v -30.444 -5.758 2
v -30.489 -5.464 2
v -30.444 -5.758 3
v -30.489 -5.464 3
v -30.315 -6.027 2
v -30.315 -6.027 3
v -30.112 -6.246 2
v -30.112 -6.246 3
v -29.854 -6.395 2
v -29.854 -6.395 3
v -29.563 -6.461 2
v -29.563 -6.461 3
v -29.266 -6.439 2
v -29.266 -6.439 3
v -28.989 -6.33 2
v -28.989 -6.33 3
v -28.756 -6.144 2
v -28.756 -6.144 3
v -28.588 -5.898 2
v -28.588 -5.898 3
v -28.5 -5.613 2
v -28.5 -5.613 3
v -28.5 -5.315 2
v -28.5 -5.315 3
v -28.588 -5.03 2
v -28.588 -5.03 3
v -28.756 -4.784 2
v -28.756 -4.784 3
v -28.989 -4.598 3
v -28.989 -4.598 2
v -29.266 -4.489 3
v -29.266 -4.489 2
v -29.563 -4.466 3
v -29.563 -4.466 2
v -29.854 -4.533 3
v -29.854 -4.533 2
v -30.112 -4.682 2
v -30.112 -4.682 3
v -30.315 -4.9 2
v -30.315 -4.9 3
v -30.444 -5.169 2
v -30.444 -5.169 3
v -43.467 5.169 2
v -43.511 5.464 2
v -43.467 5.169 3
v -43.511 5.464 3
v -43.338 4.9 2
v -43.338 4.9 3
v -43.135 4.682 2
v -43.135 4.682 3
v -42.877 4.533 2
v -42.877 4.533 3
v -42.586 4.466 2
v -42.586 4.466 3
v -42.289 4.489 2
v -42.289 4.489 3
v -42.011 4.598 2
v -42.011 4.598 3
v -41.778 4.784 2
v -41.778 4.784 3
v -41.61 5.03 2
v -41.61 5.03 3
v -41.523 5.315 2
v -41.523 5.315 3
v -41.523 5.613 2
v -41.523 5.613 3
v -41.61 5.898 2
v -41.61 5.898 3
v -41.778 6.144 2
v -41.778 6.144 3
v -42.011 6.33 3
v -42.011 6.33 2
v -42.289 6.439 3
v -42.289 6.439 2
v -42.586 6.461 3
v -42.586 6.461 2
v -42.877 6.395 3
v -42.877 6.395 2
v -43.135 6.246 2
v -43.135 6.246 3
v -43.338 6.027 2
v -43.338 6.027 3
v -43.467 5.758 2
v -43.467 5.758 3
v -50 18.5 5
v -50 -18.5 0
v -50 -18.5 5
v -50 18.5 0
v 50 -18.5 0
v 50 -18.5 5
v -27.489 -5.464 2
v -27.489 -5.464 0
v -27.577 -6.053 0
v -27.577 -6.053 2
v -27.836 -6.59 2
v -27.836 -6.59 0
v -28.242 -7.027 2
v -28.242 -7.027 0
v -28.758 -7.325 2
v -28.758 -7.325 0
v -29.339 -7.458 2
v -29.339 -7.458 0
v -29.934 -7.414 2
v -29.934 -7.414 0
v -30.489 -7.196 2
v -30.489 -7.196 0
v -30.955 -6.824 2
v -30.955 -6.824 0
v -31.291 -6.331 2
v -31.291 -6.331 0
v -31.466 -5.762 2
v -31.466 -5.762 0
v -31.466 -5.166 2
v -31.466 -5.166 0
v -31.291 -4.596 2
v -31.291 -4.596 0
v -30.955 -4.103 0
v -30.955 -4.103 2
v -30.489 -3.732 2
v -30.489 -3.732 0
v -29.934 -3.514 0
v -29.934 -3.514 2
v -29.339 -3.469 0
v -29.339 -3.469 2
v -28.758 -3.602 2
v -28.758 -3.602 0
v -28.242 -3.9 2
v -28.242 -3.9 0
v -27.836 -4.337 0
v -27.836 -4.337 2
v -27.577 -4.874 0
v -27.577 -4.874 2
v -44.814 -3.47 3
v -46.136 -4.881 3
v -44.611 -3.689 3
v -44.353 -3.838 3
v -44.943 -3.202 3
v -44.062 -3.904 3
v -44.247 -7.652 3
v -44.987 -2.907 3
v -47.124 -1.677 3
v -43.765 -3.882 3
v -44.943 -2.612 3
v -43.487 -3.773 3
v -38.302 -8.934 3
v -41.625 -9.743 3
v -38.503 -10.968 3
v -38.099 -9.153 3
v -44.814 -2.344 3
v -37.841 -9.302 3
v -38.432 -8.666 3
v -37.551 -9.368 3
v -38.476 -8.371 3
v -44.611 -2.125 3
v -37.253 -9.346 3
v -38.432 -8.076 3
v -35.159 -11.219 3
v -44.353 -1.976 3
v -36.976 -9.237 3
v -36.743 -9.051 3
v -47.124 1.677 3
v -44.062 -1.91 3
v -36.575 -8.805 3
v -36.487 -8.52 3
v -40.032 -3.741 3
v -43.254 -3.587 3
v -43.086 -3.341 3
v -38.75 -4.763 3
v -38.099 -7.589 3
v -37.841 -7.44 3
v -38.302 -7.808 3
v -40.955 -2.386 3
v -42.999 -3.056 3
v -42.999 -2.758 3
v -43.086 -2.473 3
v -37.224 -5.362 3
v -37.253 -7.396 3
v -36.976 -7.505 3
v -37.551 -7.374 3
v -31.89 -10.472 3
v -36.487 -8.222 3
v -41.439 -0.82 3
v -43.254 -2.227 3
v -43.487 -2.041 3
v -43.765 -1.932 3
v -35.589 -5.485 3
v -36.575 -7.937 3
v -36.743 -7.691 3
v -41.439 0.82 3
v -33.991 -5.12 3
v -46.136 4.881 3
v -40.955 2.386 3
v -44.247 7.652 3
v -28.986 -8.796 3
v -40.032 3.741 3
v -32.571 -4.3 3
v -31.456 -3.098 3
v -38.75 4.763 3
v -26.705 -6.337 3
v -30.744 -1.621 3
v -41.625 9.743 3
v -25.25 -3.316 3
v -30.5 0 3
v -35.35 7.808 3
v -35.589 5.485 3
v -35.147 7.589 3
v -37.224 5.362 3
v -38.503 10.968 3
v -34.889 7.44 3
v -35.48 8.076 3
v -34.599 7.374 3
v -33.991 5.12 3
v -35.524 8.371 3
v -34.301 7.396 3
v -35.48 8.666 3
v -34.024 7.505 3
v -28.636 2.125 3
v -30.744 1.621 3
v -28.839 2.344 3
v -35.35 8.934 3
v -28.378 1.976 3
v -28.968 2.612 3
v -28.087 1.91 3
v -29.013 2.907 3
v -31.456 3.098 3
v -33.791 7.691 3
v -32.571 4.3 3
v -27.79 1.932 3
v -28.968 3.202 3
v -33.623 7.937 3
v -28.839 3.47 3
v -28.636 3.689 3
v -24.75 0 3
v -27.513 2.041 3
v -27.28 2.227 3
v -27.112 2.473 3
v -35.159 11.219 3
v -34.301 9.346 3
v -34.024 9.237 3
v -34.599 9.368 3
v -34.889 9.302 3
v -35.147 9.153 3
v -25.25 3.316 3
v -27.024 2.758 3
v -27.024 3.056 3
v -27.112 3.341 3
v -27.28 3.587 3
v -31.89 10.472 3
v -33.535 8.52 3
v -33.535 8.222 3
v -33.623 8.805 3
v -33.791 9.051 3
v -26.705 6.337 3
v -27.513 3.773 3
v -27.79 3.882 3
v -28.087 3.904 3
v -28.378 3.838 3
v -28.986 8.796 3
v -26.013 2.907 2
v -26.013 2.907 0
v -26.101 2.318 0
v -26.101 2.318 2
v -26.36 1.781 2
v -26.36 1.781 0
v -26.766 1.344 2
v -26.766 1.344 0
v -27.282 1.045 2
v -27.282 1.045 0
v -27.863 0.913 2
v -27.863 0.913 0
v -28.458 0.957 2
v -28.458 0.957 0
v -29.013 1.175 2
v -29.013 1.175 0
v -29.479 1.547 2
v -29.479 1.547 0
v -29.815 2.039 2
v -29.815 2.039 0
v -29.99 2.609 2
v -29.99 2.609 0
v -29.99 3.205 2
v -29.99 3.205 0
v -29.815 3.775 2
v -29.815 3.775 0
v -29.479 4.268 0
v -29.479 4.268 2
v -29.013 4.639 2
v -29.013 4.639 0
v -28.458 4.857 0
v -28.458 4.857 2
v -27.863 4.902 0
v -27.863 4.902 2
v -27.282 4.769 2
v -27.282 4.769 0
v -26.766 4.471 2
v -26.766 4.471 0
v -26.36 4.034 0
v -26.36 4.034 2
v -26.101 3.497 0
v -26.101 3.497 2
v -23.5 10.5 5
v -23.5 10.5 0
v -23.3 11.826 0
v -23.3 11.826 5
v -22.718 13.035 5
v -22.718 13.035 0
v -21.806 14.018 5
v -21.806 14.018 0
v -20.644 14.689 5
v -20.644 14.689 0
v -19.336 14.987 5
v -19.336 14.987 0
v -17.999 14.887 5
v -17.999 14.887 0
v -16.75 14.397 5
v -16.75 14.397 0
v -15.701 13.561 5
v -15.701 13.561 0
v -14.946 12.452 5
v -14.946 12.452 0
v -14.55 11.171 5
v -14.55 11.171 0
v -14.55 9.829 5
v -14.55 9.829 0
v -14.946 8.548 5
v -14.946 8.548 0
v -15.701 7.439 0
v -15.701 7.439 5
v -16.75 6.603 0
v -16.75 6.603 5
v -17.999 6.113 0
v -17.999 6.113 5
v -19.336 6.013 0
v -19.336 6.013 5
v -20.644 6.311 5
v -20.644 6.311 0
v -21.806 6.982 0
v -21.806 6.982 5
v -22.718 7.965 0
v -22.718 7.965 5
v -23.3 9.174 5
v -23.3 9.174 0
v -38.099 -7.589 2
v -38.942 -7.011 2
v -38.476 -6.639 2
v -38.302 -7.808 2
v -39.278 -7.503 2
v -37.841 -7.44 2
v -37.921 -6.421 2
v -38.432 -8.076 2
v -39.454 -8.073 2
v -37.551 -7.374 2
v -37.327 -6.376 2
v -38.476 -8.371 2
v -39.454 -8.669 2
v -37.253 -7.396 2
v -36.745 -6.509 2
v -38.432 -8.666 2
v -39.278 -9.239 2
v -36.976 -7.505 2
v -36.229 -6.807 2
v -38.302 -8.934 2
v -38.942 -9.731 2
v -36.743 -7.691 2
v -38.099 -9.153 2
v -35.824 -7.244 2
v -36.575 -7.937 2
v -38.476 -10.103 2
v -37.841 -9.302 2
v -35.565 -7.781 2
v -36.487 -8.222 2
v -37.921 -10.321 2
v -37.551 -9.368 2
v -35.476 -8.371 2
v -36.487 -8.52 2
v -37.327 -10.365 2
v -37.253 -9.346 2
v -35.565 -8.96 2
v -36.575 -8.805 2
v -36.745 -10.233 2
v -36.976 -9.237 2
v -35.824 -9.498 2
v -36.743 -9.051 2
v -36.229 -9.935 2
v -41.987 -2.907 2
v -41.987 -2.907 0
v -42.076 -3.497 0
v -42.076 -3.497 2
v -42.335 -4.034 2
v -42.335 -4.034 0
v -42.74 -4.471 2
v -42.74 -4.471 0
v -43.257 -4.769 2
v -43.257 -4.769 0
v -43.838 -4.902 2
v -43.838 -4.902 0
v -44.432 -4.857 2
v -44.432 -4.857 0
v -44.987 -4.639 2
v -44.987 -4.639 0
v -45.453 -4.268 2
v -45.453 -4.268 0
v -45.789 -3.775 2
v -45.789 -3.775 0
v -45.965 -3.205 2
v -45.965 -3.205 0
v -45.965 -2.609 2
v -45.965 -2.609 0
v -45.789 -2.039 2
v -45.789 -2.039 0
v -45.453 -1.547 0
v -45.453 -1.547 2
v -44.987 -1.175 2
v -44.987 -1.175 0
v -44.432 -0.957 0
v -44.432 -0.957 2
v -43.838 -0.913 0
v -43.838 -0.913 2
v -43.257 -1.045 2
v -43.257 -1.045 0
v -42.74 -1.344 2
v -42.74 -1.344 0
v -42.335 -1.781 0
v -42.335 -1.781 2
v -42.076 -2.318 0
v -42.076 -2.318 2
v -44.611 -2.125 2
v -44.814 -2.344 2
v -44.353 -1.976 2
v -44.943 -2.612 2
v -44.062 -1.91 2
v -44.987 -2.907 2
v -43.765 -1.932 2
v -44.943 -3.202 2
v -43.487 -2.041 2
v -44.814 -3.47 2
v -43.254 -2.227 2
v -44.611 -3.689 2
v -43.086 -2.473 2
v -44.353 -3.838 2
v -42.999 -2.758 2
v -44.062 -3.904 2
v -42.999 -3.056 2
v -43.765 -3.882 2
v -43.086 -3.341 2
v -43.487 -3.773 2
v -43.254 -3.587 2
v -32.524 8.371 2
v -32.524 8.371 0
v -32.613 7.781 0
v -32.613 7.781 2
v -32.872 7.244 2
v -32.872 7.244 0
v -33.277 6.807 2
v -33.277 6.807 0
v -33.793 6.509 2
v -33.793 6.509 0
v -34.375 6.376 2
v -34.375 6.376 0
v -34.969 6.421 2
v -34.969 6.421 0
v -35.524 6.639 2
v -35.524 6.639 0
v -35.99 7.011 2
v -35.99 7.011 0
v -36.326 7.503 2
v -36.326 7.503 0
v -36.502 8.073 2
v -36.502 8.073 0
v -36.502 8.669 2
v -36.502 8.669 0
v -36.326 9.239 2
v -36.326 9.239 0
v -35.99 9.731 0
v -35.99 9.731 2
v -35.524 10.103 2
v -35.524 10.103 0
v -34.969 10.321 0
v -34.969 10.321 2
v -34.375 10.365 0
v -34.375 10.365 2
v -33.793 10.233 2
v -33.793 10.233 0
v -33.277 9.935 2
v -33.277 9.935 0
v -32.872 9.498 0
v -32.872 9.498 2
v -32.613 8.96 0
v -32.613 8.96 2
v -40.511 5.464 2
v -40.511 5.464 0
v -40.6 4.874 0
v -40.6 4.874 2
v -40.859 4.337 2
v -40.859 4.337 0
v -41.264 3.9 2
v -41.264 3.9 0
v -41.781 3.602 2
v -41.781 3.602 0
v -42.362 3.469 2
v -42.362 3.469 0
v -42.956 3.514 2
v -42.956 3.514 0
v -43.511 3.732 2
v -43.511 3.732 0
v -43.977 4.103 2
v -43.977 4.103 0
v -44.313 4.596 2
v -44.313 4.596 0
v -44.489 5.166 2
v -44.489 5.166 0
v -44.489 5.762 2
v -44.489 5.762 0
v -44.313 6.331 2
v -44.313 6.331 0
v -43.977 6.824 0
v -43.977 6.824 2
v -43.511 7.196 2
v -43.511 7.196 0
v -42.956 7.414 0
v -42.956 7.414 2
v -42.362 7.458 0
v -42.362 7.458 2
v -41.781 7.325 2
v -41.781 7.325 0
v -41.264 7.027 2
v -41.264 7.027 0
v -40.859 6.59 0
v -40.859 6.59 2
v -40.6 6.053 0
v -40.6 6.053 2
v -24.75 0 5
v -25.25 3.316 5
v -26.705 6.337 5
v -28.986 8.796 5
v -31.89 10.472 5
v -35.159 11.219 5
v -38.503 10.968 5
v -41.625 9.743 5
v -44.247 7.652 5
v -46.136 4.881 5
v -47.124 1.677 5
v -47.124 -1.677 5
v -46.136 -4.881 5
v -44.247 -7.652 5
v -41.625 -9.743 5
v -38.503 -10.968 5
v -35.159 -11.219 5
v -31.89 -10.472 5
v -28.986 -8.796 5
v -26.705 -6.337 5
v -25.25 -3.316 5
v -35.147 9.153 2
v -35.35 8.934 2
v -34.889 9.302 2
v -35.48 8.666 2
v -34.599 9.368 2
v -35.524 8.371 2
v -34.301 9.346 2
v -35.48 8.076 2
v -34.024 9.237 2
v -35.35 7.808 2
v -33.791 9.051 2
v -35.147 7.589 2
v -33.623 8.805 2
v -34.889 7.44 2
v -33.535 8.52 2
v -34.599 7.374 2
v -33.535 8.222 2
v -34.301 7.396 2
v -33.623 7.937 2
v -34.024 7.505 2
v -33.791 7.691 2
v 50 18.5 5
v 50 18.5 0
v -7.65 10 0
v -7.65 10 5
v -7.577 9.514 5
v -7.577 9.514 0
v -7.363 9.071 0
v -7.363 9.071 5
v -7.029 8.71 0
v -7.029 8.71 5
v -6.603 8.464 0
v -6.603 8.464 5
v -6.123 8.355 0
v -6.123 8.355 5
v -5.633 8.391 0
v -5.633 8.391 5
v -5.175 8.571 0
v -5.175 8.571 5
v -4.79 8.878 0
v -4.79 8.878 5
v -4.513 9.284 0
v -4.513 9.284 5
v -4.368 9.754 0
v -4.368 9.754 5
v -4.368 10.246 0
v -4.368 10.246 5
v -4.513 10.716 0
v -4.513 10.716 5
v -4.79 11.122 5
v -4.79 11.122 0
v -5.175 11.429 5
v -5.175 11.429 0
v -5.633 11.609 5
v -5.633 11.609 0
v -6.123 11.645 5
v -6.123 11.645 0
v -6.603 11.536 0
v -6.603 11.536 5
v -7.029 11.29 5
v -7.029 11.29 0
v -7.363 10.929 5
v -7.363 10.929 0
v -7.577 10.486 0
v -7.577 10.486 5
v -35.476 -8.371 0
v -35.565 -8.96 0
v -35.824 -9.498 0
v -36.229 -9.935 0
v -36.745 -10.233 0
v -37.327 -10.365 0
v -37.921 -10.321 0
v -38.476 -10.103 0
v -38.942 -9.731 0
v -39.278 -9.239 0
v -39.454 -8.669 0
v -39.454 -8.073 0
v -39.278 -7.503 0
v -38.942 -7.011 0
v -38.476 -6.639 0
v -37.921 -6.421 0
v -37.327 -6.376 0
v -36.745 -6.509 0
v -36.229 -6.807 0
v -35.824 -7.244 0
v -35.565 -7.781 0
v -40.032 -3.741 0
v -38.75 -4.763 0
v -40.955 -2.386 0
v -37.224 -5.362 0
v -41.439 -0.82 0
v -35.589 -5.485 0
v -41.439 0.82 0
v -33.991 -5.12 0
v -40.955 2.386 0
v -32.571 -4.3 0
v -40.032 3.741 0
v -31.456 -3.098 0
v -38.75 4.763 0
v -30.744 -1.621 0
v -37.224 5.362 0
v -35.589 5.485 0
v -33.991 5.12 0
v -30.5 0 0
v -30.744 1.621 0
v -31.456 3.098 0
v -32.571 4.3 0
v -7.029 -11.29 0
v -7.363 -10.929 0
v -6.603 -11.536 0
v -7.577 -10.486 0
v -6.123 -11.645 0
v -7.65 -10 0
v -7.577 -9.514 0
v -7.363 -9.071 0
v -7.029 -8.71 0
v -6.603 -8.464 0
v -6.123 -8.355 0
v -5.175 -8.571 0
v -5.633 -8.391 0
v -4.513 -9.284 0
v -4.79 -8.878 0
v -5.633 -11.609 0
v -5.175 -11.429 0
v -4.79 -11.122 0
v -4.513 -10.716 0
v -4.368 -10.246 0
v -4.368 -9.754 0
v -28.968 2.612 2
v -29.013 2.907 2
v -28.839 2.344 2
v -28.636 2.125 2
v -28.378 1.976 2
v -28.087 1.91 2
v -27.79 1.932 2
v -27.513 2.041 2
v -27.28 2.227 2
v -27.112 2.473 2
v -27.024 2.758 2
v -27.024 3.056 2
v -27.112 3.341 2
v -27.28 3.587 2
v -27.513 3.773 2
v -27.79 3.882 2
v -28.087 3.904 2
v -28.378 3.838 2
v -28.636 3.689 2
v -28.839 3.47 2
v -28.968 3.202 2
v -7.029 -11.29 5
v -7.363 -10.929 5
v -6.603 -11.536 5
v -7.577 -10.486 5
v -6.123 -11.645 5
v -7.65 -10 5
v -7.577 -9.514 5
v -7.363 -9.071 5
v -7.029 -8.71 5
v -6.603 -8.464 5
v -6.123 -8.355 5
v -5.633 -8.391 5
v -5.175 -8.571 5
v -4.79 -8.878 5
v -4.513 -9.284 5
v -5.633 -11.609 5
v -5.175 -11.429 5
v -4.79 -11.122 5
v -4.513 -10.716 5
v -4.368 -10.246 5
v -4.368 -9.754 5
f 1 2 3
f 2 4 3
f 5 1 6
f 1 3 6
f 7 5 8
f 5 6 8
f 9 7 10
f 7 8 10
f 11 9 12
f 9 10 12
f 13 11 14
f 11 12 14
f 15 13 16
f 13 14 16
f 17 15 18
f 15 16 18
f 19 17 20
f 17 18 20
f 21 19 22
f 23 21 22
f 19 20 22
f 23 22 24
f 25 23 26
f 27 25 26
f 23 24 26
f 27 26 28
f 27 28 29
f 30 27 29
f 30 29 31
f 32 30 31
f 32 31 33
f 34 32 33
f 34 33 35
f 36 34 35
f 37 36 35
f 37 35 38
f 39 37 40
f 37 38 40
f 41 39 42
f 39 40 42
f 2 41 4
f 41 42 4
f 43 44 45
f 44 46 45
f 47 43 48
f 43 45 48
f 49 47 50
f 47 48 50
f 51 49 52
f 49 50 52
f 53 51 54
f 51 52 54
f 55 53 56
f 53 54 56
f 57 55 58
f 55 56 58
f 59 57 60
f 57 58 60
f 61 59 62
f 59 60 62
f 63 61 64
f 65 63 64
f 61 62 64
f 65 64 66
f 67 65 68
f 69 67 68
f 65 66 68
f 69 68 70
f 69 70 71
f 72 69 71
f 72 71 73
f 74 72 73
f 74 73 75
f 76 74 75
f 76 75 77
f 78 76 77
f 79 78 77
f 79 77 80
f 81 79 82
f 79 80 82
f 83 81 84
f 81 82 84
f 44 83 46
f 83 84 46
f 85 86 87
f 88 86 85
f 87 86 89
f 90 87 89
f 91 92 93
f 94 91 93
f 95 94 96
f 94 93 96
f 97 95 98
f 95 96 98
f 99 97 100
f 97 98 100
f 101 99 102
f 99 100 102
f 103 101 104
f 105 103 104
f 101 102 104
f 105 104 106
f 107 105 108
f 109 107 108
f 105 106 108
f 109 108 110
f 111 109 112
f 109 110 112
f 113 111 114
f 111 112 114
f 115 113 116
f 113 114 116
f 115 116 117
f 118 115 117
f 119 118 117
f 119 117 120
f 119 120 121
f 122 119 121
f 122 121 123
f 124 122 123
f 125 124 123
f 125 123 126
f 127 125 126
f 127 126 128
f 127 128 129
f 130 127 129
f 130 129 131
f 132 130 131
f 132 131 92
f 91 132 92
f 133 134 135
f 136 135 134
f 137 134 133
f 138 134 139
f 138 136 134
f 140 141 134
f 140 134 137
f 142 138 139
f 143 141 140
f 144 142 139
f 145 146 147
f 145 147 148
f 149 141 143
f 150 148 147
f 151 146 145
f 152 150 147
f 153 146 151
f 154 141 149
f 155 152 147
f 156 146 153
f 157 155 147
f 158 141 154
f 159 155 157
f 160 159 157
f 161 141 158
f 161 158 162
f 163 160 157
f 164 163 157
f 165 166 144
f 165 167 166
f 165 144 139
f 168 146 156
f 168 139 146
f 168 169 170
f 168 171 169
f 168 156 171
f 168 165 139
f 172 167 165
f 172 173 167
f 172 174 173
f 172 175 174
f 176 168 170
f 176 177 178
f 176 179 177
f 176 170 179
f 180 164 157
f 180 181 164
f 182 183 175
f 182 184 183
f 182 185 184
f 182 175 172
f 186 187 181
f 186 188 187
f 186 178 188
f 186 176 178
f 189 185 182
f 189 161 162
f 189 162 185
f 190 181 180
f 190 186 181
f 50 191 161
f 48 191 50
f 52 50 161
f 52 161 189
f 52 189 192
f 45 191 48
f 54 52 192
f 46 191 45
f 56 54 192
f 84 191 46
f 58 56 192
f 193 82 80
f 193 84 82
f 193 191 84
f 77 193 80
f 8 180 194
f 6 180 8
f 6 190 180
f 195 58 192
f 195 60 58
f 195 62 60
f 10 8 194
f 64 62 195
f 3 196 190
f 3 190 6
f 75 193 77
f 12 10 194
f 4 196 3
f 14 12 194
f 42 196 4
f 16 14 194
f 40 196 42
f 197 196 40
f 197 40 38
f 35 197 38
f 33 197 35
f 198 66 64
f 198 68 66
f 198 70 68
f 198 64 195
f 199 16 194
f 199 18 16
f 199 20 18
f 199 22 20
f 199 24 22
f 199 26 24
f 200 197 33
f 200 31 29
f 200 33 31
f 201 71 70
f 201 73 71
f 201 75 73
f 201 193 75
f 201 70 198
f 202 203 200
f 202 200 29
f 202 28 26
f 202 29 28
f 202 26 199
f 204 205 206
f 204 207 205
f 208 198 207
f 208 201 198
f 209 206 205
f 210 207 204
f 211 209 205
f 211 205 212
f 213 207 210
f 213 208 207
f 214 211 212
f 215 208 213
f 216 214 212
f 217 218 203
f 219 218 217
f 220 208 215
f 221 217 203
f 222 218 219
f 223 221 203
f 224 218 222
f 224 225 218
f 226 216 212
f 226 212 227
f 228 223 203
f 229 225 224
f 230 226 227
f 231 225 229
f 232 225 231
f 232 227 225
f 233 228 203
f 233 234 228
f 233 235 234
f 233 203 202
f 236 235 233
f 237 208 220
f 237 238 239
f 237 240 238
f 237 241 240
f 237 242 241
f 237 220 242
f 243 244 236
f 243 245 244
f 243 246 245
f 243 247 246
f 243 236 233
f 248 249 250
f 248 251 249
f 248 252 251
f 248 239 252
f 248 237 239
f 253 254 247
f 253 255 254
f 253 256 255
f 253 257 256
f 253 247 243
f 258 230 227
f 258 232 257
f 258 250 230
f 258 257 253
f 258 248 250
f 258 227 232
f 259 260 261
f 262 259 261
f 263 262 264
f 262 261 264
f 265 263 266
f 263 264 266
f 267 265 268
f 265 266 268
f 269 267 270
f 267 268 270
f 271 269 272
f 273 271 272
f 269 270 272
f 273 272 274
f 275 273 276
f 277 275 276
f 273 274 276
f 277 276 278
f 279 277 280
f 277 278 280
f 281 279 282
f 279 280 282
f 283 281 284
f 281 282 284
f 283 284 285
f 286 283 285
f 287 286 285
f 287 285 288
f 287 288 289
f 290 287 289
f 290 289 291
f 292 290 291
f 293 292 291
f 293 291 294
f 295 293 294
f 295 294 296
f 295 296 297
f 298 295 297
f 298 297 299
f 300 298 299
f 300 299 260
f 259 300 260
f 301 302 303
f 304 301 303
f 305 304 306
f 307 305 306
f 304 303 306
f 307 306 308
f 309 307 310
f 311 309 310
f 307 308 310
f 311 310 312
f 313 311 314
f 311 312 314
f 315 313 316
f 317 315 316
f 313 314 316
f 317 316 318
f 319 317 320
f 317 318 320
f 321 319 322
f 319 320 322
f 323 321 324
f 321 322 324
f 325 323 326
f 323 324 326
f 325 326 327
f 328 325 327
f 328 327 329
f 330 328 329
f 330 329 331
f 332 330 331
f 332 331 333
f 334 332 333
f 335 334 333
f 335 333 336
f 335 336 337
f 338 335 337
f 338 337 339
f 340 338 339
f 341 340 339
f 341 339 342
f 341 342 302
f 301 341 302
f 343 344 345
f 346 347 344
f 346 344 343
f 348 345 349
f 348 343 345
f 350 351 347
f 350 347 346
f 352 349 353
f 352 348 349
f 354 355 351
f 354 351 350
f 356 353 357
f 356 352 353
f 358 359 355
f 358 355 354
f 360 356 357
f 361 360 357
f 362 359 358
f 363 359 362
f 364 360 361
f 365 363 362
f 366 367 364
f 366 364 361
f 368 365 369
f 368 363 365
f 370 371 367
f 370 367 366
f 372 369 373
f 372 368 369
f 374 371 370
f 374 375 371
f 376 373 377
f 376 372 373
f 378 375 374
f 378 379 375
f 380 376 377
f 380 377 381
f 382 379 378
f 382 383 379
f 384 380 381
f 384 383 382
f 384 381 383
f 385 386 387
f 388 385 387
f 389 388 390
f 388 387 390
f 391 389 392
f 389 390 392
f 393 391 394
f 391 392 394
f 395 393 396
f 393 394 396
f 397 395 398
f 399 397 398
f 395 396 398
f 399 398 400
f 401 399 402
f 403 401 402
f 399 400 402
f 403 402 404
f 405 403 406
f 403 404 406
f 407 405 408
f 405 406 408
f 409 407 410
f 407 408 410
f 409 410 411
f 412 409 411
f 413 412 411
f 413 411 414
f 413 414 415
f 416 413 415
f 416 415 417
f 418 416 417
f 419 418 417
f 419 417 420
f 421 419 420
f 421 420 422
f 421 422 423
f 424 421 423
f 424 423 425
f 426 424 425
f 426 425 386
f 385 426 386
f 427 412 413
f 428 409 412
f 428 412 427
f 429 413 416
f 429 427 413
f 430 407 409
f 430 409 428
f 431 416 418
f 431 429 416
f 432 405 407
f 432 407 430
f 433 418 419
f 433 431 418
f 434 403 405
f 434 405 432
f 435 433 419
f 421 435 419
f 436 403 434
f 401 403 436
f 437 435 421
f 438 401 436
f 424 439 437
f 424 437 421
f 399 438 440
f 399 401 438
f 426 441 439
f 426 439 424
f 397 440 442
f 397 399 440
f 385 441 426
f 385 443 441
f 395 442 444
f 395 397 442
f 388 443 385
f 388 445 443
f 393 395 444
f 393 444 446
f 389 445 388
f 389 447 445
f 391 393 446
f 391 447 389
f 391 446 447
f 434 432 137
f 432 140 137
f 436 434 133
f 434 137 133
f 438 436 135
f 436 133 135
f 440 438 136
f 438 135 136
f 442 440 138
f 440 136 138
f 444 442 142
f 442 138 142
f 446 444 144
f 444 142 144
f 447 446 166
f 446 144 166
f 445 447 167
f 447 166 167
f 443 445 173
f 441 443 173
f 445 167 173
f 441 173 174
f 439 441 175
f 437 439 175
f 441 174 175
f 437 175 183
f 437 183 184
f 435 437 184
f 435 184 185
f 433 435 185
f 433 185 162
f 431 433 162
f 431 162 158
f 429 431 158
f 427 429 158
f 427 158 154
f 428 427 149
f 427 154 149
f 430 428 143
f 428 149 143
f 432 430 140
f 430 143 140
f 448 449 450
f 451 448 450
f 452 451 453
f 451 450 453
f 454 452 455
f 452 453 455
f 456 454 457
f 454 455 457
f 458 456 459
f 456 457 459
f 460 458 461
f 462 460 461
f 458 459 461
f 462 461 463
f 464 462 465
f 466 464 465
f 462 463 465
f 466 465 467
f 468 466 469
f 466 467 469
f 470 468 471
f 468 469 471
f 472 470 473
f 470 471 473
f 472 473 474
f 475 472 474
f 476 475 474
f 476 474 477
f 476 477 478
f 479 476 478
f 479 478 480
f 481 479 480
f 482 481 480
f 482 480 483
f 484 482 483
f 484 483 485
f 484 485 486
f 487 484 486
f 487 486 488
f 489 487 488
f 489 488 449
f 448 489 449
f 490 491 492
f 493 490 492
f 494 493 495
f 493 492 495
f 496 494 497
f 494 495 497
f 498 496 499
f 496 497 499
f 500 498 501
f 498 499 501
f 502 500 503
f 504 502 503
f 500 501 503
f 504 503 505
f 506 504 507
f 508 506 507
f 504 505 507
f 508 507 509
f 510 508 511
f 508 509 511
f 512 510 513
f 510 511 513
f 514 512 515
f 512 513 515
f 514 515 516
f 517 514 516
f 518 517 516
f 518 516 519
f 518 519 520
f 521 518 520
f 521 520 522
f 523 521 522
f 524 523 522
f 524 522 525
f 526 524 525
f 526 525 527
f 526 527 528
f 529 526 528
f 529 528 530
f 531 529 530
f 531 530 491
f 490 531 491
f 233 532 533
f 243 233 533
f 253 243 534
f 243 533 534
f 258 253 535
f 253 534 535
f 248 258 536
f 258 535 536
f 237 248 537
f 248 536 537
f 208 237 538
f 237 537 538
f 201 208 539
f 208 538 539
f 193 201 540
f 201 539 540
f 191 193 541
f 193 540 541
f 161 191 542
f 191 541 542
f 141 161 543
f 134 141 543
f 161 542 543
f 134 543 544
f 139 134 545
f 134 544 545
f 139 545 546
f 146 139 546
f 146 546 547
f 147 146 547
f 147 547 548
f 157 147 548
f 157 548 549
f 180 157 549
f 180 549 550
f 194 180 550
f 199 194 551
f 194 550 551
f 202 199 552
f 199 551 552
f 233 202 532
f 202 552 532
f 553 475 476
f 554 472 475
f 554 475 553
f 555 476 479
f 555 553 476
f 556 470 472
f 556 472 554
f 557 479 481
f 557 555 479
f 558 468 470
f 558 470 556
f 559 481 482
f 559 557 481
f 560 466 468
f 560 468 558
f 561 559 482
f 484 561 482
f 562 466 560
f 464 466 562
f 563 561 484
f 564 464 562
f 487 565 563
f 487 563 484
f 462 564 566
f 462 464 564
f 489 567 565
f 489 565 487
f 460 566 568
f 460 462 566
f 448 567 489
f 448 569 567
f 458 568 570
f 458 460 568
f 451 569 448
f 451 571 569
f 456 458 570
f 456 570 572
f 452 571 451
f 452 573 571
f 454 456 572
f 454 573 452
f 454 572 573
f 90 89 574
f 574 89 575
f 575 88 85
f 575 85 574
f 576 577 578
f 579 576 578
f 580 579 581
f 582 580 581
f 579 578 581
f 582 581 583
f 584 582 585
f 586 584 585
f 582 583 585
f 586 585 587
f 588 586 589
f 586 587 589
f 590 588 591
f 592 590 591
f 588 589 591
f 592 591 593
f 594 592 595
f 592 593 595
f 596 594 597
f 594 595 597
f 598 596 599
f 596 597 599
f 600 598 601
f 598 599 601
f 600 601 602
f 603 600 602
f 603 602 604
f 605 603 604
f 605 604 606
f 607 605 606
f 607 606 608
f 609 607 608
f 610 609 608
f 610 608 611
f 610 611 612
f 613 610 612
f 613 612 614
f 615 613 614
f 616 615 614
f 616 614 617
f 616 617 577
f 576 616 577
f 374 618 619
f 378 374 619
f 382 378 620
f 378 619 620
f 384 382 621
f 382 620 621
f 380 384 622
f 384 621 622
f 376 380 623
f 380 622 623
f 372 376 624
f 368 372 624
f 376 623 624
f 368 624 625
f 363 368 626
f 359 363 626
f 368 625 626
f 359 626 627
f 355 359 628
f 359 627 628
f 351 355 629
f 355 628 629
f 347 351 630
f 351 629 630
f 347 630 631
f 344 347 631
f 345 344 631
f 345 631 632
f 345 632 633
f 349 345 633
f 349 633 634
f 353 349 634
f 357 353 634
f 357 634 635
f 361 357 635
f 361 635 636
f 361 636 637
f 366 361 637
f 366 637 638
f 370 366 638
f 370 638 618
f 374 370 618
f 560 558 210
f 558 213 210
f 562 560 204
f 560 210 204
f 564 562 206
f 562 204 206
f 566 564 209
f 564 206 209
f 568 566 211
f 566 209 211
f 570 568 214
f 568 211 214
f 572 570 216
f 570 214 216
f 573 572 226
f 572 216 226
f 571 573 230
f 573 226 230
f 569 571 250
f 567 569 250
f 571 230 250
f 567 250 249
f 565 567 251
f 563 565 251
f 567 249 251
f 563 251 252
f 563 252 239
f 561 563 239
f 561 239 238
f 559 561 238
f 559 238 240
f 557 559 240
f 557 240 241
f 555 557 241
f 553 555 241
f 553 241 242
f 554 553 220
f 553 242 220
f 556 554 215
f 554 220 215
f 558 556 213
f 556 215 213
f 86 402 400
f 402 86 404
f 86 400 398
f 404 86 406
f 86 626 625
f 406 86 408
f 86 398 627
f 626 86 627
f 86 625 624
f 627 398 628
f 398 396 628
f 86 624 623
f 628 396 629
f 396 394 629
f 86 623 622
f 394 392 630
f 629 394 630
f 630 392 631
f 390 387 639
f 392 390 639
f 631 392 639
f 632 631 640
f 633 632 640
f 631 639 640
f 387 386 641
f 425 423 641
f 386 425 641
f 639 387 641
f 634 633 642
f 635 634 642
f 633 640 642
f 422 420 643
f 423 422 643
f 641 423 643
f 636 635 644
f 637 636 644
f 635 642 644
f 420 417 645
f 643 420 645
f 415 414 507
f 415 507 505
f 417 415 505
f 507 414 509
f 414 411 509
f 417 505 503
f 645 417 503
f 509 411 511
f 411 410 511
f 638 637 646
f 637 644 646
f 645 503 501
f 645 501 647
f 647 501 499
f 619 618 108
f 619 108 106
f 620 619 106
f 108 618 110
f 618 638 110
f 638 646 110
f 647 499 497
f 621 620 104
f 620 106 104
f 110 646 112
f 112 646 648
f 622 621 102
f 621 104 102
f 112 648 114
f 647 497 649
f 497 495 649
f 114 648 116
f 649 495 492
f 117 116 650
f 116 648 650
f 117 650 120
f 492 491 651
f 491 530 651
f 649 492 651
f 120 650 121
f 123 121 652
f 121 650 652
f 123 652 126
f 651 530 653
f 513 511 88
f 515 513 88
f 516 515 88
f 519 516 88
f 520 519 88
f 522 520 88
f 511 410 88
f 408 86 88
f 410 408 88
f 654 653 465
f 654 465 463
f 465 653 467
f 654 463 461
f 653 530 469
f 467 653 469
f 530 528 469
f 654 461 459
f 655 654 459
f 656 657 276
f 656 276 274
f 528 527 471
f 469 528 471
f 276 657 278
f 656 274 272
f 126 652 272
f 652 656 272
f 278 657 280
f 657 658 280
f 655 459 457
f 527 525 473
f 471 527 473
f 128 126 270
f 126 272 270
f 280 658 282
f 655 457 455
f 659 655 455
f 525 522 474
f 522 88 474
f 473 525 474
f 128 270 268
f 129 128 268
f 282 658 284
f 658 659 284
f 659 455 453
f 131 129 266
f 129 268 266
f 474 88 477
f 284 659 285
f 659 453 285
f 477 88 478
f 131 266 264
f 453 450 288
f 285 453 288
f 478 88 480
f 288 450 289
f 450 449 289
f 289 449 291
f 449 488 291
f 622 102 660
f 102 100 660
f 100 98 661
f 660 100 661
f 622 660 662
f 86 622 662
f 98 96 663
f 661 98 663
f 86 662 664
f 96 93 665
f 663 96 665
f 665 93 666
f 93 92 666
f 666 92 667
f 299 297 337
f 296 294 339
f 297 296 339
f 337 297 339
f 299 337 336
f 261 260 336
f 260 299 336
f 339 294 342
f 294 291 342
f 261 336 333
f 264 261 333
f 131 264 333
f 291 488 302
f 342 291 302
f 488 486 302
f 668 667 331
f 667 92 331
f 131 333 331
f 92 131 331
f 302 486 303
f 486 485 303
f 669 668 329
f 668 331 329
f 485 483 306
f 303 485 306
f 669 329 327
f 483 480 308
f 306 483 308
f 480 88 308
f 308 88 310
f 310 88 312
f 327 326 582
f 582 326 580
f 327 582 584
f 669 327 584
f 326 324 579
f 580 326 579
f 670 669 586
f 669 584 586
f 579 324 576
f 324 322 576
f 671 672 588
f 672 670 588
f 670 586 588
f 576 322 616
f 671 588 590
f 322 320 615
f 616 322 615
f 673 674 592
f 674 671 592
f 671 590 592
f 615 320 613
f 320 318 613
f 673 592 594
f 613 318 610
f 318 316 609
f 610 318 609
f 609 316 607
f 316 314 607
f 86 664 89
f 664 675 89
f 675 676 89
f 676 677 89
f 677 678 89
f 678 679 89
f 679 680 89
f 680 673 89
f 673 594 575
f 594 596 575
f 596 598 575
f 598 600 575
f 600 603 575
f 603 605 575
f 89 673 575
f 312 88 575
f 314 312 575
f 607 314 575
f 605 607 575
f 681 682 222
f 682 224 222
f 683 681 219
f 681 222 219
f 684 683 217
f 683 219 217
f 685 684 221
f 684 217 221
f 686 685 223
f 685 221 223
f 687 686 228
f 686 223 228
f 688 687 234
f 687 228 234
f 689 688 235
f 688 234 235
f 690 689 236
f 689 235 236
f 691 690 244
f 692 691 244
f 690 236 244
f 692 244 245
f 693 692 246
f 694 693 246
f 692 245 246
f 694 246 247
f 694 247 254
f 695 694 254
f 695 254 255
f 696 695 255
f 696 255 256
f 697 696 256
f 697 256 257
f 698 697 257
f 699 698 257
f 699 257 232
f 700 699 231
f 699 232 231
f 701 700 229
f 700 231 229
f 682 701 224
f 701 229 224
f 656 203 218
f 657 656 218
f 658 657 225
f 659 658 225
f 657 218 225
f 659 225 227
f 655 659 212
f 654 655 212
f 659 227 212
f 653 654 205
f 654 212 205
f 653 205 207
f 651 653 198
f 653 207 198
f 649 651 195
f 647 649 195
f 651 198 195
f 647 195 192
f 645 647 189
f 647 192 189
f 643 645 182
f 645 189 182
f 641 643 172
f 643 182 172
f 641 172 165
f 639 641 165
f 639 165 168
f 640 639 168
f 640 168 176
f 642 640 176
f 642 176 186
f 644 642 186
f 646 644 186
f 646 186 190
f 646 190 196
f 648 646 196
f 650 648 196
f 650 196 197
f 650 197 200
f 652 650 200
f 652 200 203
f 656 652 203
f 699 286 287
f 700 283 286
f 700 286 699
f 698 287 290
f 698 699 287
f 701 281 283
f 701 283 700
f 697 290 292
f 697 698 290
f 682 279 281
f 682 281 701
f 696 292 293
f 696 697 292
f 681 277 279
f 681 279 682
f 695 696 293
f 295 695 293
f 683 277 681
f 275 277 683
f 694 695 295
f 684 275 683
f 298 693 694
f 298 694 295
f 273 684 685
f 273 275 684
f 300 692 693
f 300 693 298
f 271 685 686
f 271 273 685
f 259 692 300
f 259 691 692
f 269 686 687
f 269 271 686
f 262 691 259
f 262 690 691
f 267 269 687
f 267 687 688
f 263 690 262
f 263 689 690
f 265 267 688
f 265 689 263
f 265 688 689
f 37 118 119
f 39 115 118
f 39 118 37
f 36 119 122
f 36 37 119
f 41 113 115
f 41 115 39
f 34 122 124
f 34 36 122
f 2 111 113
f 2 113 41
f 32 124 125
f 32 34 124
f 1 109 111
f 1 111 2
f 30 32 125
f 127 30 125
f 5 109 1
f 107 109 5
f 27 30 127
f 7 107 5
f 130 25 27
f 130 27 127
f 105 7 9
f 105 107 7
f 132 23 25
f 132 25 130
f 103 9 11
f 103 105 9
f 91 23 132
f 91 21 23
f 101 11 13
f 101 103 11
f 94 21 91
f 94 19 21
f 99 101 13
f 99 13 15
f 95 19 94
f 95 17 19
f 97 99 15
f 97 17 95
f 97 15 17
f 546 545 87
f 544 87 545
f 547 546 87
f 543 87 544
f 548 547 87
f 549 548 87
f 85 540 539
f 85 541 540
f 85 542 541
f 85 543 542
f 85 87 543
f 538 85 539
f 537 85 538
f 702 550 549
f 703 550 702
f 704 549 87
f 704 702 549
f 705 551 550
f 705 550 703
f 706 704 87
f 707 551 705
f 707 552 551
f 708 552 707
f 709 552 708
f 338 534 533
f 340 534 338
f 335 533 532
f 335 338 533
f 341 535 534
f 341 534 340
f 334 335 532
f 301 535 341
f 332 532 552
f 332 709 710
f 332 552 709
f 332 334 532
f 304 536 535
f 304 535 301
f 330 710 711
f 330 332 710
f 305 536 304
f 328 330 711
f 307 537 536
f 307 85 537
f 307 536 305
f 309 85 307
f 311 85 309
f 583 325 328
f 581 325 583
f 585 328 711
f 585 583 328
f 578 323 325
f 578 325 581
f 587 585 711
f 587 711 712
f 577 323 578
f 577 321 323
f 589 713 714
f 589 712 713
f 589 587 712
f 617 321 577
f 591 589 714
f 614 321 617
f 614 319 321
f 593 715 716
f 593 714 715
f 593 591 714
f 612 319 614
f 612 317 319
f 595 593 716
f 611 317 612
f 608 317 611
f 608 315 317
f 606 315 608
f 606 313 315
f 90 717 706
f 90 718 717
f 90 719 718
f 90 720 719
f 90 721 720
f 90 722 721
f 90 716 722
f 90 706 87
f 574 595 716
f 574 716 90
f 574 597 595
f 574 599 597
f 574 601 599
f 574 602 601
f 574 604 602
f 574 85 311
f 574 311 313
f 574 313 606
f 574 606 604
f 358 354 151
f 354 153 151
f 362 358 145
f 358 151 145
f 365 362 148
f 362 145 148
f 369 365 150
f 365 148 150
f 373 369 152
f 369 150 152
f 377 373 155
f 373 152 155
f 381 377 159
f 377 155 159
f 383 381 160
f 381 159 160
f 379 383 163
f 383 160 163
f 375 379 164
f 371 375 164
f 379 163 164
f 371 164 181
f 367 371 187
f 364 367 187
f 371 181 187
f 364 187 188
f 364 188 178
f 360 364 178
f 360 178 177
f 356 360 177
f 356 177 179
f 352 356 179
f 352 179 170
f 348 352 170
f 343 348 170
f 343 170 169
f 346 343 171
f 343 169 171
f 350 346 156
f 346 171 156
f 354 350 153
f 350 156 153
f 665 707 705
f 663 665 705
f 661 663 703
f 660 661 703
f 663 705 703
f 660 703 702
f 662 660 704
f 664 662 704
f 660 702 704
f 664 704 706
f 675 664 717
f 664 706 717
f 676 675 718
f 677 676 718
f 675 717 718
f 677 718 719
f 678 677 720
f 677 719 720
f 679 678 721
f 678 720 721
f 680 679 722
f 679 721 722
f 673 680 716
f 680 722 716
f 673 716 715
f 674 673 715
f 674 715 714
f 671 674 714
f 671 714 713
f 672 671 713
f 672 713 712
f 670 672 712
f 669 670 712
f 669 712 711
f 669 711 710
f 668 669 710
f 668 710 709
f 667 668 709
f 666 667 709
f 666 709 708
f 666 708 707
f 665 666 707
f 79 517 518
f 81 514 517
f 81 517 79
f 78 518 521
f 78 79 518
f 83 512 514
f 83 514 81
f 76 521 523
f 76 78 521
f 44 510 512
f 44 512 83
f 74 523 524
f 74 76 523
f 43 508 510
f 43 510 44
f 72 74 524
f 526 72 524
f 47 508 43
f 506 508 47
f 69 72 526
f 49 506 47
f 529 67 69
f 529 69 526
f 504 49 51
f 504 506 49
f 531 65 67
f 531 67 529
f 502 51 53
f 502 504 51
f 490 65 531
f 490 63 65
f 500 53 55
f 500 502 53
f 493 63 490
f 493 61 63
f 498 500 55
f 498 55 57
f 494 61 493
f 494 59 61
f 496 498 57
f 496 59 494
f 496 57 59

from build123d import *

# Parameters (mm, degrees)
F0_W           = 100
F0_H           = 37
F1_DEPTH       = 5
F2_R           = 5.5
F3_DEPTH       = 5
F4_R           = 11.25
F5_DEPTH       = 2
F7_D           = 2
F7_DEPTH       = 6
F7_CBORE_D     = 4
F7_CBORE_DEPTH = 2
F7_TIP         = 0.600860619
F9_D           = 9
F9_DEPTH       = 7
F9_TIP         = 2.7038727856
F11_D          = 3.3
F11_DEPTH      = 6
F11_TIP        = 0.9914200214


with BuildPart() as f1:
    # F0 (on Top) → F1 (new body)
    with BuildSketch(Plane.XY):
        Rectangle(F0_W, F0_H)
    extrude(amount=F1_DEPTH)

    # F2 (on face) → F3 (cut)
    with BuildSketch(Plane.XY.offset(5)):
        with Locations((-36, 0)):
            Circle(F2_R)
    extrude(amount=-F3_DEPTH, mode=Mode.SUBTRACT)

    # F4 (on face) → F5 (cut)
    with BuildSketch(Plane.XY.offset(5)):
        with Locations((-36, 0)):
            Circle(F4_R)
    extrude(amount=-F5_DEPTH, mode=Mode.SUBTRACT)

    # F7
    with Locations(Plane(origin=(0, 0, 0), x_dir=(1, 0, 0), z_dir=(0, 0, -1))):
        with Locations((-37.4760095102, 8.3708659006), (-43.9873872767, 2.9071712183), (-42.5113777665, -5.4636946823), (-34.5239904898, -8.3708659006), (-28.0126127233, -2.9071712183), (-29.4886222335, 5.4636946823)):
            CounterBoreHole(F7_D / 2, F7_CBORE_D / 2, F7_CBORE_DEPTH, depth=F7_DEPTH)
            with Locations((0, 0, -(F7_DEPTH + F7_TIP / 2))):  # 118° drill point
                Cone(0, F7_D / 2, F7_TIP, mode=Mode.SUBTRACT)

    # F9
    with Locations(Plane.XY.offset(5)):
        with Locations((-19, 10.5)):
            Hole(F9_D / 2, depth=F9_DEPTH)
            with Locations((0, 0, -(F9_DEPTH + F9_TIP / 2))):  # 118° drill point
                Cone(0, F9_D / 2, F9_TIP, mode=Mode.SUBTRACT)

    # F11
    with Locations(Plane(origin=(0, 0, 0), x_dir=(1, 0, 0), z_dir=(0, 0, -1))):
        with Locations((-6, 10), (-6, -10)):
            Hole(F11_D / 2, depth=F11_DEPTH)
            with Locations((0, 0, -(F11_DEPTH + F11_TIP / 2))):  # 118° drill point
                Cone(0, F11_D / 2, F11_TIP, mode=Mode.SUBTRACT)


solid = f1.part
